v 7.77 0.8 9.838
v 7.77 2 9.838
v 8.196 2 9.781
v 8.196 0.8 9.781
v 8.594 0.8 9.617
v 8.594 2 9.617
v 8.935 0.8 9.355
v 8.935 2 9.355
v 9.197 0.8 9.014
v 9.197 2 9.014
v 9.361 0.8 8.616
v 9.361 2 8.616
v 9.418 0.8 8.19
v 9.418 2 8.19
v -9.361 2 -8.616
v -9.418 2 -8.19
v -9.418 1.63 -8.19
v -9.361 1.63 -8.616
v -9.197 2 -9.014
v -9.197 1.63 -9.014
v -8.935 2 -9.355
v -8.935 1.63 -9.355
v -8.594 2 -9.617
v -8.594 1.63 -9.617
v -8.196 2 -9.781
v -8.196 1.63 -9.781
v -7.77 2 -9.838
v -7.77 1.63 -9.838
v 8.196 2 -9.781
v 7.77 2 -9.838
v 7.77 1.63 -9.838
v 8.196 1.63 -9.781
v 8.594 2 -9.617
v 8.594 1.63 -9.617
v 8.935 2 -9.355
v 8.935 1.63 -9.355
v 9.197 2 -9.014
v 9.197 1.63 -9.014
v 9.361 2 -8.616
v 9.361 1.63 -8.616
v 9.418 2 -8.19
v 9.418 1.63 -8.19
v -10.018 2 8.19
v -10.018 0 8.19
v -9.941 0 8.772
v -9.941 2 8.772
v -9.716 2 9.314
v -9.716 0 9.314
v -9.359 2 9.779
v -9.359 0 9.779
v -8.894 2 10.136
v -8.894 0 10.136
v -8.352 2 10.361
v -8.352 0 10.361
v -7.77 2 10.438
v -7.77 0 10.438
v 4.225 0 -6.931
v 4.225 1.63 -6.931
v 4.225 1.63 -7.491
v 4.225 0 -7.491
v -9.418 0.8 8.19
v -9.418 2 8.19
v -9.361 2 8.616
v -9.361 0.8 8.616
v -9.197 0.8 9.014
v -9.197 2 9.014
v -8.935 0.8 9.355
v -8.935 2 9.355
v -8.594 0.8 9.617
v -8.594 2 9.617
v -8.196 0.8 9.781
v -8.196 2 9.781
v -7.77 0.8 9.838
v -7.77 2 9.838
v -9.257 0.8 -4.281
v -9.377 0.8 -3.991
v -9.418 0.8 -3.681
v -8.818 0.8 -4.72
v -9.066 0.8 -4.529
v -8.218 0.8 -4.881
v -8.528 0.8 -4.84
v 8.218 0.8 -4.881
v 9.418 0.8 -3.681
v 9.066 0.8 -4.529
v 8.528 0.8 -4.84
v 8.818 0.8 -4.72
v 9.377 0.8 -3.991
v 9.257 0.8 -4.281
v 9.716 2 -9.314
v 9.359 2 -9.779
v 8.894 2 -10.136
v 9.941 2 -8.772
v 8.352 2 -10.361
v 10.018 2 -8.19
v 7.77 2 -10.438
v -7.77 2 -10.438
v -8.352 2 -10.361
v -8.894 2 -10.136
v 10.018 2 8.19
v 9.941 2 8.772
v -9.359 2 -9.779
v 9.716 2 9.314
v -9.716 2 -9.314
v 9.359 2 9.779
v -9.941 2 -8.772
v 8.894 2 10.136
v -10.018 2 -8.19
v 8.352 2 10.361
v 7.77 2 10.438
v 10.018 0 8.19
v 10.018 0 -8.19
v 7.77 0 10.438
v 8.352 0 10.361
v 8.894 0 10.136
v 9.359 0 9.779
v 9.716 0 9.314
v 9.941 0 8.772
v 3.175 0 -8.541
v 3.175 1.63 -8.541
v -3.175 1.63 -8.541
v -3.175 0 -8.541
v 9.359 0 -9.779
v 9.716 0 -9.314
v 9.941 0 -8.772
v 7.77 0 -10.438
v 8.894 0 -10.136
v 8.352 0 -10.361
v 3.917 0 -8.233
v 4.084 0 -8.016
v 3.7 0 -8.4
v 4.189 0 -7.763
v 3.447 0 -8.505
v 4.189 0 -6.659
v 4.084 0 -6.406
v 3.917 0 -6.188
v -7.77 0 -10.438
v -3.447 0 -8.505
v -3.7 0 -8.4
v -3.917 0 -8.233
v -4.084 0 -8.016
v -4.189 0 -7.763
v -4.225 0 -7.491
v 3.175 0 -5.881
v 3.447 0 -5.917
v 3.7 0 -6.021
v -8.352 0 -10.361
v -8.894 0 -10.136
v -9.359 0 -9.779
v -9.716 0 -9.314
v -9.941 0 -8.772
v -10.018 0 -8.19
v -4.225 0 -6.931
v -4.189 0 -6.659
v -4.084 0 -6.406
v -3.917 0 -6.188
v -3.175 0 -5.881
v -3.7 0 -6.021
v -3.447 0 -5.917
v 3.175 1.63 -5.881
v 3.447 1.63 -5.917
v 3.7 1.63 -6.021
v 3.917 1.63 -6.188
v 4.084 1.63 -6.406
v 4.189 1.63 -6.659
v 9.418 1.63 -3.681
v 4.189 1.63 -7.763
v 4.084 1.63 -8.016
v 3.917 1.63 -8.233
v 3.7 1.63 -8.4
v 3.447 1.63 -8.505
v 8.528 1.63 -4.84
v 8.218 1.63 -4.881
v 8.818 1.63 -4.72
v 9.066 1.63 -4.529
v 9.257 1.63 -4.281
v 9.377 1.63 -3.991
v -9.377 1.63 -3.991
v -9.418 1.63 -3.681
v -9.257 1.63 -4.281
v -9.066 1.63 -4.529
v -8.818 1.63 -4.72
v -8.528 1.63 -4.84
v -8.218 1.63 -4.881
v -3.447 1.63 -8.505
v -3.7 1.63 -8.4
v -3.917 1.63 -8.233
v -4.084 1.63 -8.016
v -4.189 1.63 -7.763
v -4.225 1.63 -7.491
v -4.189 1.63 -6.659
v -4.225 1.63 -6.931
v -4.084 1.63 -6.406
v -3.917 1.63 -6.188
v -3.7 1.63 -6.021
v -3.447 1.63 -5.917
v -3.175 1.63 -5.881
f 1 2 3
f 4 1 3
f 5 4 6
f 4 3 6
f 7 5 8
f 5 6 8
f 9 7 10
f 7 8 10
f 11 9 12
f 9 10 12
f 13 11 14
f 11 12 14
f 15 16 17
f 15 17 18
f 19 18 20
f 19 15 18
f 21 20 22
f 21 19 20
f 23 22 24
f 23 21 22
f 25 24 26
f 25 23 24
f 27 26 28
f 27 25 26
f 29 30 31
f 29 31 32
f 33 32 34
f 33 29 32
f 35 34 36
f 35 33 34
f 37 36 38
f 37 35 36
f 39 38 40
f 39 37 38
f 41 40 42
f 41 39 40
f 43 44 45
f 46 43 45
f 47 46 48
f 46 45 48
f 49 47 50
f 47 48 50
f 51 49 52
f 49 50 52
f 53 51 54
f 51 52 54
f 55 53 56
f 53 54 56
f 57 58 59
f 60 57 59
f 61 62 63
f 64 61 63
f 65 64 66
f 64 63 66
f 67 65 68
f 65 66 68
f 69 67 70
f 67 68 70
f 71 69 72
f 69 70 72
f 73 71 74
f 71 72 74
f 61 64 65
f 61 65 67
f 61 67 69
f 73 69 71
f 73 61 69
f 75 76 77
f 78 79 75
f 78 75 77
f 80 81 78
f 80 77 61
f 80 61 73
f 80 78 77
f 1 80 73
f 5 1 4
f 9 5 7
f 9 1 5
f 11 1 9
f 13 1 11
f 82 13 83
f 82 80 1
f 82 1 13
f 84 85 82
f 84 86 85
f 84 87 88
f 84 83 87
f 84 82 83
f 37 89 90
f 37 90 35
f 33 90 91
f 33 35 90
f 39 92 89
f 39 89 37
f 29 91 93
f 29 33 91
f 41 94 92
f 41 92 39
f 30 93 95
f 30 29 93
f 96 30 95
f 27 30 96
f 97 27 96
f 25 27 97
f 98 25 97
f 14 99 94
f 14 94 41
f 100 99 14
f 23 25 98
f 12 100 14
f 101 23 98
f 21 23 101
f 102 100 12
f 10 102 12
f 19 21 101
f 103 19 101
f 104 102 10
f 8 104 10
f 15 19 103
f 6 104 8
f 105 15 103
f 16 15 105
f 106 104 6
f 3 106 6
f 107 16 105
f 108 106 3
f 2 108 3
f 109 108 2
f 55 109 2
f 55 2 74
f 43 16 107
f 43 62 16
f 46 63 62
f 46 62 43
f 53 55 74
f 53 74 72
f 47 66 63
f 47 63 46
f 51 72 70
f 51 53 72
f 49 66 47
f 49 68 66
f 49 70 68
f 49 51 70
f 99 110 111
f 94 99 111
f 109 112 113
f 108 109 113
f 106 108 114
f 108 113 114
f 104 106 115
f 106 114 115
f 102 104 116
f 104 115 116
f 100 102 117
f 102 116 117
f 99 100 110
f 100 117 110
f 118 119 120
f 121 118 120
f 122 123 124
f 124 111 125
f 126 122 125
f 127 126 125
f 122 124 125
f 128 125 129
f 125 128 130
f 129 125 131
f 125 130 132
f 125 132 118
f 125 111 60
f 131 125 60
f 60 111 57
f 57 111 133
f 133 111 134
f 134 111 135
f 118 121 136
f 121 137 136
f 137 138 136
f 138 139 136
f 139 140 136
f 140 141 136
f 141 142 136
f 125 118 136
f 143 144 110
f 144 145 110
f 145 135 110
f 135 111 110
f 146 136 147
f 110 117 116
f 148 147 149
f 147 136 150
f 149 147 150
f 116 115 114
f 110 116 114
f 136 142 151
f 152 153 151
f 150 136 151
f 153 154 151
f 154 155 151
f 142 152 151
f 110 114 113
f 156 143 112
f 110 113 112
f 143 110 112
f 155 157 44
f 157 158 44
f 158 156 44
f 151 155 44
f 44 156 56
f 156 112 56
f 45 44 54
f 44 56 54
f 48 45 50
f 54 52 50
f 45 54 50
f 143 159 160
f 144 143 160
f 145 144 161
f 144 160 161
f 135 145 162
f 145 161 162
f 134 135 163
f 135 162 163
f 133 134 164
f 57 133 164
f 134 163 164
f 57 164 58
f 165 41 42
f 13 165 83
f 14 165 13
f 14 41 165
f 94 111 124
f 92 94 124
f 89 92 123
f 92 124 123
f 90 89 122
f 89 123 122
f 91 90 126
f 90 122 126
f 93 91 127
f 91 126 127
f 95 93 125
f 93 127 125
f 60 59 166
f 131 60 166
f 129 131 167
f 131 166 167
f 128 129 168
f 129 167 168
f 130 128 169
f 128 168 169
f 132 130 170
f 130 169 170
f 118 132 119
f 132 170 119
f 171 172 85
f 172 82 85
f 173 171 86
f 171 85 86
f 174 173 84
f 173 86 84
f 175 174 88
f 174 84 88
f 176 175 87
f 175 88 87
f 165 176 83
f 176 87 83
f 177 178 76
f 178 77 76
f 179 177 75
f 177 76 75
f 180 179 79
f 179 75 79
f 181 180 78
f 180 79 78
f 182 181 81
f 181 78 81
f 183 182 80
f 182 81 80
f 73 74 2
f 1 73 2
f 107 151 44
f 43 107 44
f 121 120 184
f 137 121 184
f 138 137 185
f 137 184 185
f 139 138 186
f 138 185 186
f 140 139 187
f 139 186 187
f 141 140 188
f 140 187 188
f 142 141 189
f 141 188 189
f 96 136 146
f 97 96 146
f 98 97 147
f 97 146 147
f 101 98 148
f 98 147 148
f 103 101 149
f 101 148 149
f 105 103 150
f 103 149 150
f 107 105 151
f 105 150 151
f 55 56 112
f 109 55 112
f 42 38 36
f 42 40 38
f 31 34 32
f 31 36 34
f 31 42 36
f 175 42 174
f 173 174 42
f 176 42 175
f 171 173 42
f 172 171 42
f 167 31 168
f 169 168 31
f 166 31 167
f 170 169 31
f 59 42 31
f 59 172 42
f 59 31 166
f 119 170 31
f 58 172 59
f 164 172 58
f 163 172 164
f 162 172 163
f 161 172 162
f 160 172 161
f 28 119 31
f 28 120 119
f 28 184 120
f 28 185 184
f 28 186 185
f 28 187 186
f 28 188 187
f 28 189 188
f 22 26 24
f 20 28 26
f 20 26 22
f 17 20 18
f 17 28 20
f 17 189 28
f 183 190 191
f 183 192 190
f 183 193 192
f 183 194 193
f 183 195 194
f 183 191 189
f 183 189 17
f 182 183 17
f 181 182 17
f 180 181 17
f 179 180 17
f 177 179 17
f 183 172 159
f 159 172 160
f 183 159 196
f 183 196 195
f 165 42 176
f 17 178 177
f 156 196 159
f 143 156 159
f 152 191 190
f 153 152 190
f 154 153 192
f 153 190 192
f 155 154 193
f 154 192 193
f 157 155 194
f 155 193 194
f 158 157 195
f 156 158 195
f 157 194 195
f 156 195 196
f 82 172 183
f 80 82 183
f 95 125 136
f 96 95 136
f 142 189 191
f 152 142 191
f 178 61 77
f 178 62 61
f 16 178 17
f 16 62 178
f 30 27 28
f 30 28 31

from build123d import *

# Parameters (mm, degrees)
EXTRUDE_1_DEPTH     = 2
CUT_EXTRUDE_1_DEPTH = 15.604642381
EXTRUDE_START       = -1.63
EXTRUDE_2_DEPTH     = 1.63
CUT_EXTRUDE_2_DEPTH = 1.2
CUT_EXTRUDE_3_DEPTH = 0.37
FILLET_3_R          = 1.2


with BuildPart() as part:
    # 草图1 → 凸台-拉伸1 (new body)
    with BuildSketch(Plane(origin=(0, 0, 0), x_dir=(-1, 0, 0), z_dir=(0, 1, 0))):
        with BuildLine():
            Line((7.77, 10.437594514), (-7.77, 10.437594514))
            ThreePointArc((-7.77, 10.437594514), (-9.359289322, 9.779289322), (-10.017594514, 8.19))
            Line((-10.017594514, 8.19), (-10.017594514, -8.19))
            ThreePointArc((-10.017594514, -8.19), (-9.359289322, -9.779289322), (-7.77, -10.437594514))
            Line((-7.77, -10.437594514), (7.77, -10.437594514))
            ThreePointArc((7.77, -10.437594514), (9.359289322, -9.779289322), (10.017594514, -8.19))
            Line((10.017594514, -8.19), (10.017594514, 8.19))
            ThreePointArc((10.017594514, 8.19), (9.359289322, 9.779289322), (7.77, 10.437594514))
        make_face()
    extrude(amount=EXTRUDE_1_DEPTH)

    # 草图3 → 切除-拉伸1 (cut, through all)
    with BuildSketch(Plane(origin=(0, 2, 0), x_dir=(1, 0, 0), z_dir=(0, 1, 0))):
        with BuildLine():
            Line((3.175, 8.940777212), (-3.175, 8.940777212))
            ThreePointArc((-3.175, 8.940777212), (-4.200304833, 8.516082045), (-4.625, 7.490777212))
            Line((-4.625, 7.490777212), (-4.625, 6.930777212))
            ThreePointArc((-4.625, 6.930777212), (-4.200304833, 5.90547238), (-3.175, 5.480777212))
            Line((-3.175, 5.480777212), (3.175, 5.480777212))
            ThreePointArc((3.175, 5.480777212), (4.200304833, 5.90547238), (4.625, 6.930777212))
            Line((4.625, 6.930777212), (4.625, 7.490777212))
            ThreePointArc((4.625, 7.490777212), (4.200304833, 8.516082045), (3.175, 8.940777212))
        make_face()
    extrude(amount=-CUT_EXTRUDE_1_DEPTH, mode=Mode.SUBTRACT)

    # 草图4 → 凸台-拉伸2 (add)
    with BuildSketch(Plane.XZ.offset(EXTRUDE_START)):
        with BuildLine():
            Line((-4.625, -7.490777212), (-4.625, -6.930777212))
            ThreePointArc((-4.625, -6.930777212), (-4.200304833, -5.90547238), (-3.175, -5.480777212))
            Line((-3.175, -5.480777212), (3.175, -5.480777212))
            ThreePointArc((3.175, -5.480777212), (4.200304833, -5.90547238), (4.625, -6.930777212))
            Line((4.625, -6.930777212), (4.625, -7.490777212))
            ThreePointArc((4.625, -7.490777212), (4.200304833, -8.516082045), (3.175, -8.940777212))
            Line((3.175, -8.940777212), (-3.175, -8.940777212))
            ThreePointArc((-3.175, -8.940777212), (-4.200304833, -8.516082045), (-4.625, -7.490777212))
        make_face()
        with BuildLine():
            Line((3.175, -8.540777212), (-3.175, -8.540777212))
            ThreePointArc((-3.175, -8.540777212), (-3.91746212, -8.233239333), (-4.225, -7.490777212))
            Line((-4.225, -7.490777212), (-4.225, -6.930777212))
            ThreePointArc((-4.225, -6.930777212), (-3.91746212, -6.188315092), (-3.175, -5.880777212))
            Line((-3.175, -5.880777212), (3.175, -5.880777212))
            ThreePointArc((3.175, -5.880777212), (3.91746212, -6.188315092), (4.225, -6.930777212))
            Line((4.225, -6.930777212), (4.225, -7.490777212))
            ThreePointArc((4.225, -7.490777212), (3.91746212, -8.233239333), (3.175, -8.540777212))
        make_face(mode=Mode.SUBTRACT)
    extrude(amount=EXTRUDE_2_DEPTH)

    # 草图5 → 切除-拉伸2 (cut)
    with BuildSketch(Plane(origin=(0, 2, 0), x_dir=(1, 0, 0), z_dir=(0, 1, 0))):
        with BuildLine():
            Line((9.417594514, 4.880777212), (-9.417594514, 4.880777212))
            Line((-9.417594514, 4.880777212), (-9.417594514, -8.19))
            ThreePointArc((-9.417594514, -8.19), (-8.935025253, -9.355025253), (-7.77, -9.837594514))
            Line((-7.77, -9.837594514), (7.77, -9.837594514))
            ThreePointArc((7.77, -9.837594514), (8.935025253, -9.355025253), (9.417594514, -8.19))
            Line((9.417594514, -8.19), (9.417594514, 4.880777212))
        make_face()
    extrude(amount=-CUT_EXTRUDE_2_DEPTH, mode=Mode.SUBTRACT)

    # 草图7 → 切除-拉伸3 (cut)
    with BuildSketch(Plane(origin=(0, 2, 0), x_dir=(1, 0, 0), z_dir=(0, 1, 0))):
        with BuildLine():
            Line((9.417594514, 8.19), (9.417594514, 4.880777212))
            Line((9.417594514, 4.880777212), (-9.417594514, 4.880777212))
            Line((-9.417594514, 4.880777212), (-9.417594514, 8.19))
            ThreePointArc((-9.417594514, 8.19), (-8.935025253, 9.355025253), (-7.77, 9.837594514))
            Line((-7.77, 9.837594514), (7.77, 9.837594514))
            ThreePointArc((7.77, 9.837594514), (8.935025253, 9.355025253), (9.417594514, 8.19))
        make_face()
    extrude(amount=-CUT_EXTRUDE_3_DEPTH, mode=Mode.SUBTRACT)

    # 圆角3
    fillet_3_edges = [part.edges().sort_by_distance(p)[0] for p in [
        (9.417594514, 1.215, -4.880777212),
        (-9.417594514, 1.215, -4.880777212),
    ]]
    fillet(fillet_3_edges, radius=FILLET_3_R)


solid = part.part
